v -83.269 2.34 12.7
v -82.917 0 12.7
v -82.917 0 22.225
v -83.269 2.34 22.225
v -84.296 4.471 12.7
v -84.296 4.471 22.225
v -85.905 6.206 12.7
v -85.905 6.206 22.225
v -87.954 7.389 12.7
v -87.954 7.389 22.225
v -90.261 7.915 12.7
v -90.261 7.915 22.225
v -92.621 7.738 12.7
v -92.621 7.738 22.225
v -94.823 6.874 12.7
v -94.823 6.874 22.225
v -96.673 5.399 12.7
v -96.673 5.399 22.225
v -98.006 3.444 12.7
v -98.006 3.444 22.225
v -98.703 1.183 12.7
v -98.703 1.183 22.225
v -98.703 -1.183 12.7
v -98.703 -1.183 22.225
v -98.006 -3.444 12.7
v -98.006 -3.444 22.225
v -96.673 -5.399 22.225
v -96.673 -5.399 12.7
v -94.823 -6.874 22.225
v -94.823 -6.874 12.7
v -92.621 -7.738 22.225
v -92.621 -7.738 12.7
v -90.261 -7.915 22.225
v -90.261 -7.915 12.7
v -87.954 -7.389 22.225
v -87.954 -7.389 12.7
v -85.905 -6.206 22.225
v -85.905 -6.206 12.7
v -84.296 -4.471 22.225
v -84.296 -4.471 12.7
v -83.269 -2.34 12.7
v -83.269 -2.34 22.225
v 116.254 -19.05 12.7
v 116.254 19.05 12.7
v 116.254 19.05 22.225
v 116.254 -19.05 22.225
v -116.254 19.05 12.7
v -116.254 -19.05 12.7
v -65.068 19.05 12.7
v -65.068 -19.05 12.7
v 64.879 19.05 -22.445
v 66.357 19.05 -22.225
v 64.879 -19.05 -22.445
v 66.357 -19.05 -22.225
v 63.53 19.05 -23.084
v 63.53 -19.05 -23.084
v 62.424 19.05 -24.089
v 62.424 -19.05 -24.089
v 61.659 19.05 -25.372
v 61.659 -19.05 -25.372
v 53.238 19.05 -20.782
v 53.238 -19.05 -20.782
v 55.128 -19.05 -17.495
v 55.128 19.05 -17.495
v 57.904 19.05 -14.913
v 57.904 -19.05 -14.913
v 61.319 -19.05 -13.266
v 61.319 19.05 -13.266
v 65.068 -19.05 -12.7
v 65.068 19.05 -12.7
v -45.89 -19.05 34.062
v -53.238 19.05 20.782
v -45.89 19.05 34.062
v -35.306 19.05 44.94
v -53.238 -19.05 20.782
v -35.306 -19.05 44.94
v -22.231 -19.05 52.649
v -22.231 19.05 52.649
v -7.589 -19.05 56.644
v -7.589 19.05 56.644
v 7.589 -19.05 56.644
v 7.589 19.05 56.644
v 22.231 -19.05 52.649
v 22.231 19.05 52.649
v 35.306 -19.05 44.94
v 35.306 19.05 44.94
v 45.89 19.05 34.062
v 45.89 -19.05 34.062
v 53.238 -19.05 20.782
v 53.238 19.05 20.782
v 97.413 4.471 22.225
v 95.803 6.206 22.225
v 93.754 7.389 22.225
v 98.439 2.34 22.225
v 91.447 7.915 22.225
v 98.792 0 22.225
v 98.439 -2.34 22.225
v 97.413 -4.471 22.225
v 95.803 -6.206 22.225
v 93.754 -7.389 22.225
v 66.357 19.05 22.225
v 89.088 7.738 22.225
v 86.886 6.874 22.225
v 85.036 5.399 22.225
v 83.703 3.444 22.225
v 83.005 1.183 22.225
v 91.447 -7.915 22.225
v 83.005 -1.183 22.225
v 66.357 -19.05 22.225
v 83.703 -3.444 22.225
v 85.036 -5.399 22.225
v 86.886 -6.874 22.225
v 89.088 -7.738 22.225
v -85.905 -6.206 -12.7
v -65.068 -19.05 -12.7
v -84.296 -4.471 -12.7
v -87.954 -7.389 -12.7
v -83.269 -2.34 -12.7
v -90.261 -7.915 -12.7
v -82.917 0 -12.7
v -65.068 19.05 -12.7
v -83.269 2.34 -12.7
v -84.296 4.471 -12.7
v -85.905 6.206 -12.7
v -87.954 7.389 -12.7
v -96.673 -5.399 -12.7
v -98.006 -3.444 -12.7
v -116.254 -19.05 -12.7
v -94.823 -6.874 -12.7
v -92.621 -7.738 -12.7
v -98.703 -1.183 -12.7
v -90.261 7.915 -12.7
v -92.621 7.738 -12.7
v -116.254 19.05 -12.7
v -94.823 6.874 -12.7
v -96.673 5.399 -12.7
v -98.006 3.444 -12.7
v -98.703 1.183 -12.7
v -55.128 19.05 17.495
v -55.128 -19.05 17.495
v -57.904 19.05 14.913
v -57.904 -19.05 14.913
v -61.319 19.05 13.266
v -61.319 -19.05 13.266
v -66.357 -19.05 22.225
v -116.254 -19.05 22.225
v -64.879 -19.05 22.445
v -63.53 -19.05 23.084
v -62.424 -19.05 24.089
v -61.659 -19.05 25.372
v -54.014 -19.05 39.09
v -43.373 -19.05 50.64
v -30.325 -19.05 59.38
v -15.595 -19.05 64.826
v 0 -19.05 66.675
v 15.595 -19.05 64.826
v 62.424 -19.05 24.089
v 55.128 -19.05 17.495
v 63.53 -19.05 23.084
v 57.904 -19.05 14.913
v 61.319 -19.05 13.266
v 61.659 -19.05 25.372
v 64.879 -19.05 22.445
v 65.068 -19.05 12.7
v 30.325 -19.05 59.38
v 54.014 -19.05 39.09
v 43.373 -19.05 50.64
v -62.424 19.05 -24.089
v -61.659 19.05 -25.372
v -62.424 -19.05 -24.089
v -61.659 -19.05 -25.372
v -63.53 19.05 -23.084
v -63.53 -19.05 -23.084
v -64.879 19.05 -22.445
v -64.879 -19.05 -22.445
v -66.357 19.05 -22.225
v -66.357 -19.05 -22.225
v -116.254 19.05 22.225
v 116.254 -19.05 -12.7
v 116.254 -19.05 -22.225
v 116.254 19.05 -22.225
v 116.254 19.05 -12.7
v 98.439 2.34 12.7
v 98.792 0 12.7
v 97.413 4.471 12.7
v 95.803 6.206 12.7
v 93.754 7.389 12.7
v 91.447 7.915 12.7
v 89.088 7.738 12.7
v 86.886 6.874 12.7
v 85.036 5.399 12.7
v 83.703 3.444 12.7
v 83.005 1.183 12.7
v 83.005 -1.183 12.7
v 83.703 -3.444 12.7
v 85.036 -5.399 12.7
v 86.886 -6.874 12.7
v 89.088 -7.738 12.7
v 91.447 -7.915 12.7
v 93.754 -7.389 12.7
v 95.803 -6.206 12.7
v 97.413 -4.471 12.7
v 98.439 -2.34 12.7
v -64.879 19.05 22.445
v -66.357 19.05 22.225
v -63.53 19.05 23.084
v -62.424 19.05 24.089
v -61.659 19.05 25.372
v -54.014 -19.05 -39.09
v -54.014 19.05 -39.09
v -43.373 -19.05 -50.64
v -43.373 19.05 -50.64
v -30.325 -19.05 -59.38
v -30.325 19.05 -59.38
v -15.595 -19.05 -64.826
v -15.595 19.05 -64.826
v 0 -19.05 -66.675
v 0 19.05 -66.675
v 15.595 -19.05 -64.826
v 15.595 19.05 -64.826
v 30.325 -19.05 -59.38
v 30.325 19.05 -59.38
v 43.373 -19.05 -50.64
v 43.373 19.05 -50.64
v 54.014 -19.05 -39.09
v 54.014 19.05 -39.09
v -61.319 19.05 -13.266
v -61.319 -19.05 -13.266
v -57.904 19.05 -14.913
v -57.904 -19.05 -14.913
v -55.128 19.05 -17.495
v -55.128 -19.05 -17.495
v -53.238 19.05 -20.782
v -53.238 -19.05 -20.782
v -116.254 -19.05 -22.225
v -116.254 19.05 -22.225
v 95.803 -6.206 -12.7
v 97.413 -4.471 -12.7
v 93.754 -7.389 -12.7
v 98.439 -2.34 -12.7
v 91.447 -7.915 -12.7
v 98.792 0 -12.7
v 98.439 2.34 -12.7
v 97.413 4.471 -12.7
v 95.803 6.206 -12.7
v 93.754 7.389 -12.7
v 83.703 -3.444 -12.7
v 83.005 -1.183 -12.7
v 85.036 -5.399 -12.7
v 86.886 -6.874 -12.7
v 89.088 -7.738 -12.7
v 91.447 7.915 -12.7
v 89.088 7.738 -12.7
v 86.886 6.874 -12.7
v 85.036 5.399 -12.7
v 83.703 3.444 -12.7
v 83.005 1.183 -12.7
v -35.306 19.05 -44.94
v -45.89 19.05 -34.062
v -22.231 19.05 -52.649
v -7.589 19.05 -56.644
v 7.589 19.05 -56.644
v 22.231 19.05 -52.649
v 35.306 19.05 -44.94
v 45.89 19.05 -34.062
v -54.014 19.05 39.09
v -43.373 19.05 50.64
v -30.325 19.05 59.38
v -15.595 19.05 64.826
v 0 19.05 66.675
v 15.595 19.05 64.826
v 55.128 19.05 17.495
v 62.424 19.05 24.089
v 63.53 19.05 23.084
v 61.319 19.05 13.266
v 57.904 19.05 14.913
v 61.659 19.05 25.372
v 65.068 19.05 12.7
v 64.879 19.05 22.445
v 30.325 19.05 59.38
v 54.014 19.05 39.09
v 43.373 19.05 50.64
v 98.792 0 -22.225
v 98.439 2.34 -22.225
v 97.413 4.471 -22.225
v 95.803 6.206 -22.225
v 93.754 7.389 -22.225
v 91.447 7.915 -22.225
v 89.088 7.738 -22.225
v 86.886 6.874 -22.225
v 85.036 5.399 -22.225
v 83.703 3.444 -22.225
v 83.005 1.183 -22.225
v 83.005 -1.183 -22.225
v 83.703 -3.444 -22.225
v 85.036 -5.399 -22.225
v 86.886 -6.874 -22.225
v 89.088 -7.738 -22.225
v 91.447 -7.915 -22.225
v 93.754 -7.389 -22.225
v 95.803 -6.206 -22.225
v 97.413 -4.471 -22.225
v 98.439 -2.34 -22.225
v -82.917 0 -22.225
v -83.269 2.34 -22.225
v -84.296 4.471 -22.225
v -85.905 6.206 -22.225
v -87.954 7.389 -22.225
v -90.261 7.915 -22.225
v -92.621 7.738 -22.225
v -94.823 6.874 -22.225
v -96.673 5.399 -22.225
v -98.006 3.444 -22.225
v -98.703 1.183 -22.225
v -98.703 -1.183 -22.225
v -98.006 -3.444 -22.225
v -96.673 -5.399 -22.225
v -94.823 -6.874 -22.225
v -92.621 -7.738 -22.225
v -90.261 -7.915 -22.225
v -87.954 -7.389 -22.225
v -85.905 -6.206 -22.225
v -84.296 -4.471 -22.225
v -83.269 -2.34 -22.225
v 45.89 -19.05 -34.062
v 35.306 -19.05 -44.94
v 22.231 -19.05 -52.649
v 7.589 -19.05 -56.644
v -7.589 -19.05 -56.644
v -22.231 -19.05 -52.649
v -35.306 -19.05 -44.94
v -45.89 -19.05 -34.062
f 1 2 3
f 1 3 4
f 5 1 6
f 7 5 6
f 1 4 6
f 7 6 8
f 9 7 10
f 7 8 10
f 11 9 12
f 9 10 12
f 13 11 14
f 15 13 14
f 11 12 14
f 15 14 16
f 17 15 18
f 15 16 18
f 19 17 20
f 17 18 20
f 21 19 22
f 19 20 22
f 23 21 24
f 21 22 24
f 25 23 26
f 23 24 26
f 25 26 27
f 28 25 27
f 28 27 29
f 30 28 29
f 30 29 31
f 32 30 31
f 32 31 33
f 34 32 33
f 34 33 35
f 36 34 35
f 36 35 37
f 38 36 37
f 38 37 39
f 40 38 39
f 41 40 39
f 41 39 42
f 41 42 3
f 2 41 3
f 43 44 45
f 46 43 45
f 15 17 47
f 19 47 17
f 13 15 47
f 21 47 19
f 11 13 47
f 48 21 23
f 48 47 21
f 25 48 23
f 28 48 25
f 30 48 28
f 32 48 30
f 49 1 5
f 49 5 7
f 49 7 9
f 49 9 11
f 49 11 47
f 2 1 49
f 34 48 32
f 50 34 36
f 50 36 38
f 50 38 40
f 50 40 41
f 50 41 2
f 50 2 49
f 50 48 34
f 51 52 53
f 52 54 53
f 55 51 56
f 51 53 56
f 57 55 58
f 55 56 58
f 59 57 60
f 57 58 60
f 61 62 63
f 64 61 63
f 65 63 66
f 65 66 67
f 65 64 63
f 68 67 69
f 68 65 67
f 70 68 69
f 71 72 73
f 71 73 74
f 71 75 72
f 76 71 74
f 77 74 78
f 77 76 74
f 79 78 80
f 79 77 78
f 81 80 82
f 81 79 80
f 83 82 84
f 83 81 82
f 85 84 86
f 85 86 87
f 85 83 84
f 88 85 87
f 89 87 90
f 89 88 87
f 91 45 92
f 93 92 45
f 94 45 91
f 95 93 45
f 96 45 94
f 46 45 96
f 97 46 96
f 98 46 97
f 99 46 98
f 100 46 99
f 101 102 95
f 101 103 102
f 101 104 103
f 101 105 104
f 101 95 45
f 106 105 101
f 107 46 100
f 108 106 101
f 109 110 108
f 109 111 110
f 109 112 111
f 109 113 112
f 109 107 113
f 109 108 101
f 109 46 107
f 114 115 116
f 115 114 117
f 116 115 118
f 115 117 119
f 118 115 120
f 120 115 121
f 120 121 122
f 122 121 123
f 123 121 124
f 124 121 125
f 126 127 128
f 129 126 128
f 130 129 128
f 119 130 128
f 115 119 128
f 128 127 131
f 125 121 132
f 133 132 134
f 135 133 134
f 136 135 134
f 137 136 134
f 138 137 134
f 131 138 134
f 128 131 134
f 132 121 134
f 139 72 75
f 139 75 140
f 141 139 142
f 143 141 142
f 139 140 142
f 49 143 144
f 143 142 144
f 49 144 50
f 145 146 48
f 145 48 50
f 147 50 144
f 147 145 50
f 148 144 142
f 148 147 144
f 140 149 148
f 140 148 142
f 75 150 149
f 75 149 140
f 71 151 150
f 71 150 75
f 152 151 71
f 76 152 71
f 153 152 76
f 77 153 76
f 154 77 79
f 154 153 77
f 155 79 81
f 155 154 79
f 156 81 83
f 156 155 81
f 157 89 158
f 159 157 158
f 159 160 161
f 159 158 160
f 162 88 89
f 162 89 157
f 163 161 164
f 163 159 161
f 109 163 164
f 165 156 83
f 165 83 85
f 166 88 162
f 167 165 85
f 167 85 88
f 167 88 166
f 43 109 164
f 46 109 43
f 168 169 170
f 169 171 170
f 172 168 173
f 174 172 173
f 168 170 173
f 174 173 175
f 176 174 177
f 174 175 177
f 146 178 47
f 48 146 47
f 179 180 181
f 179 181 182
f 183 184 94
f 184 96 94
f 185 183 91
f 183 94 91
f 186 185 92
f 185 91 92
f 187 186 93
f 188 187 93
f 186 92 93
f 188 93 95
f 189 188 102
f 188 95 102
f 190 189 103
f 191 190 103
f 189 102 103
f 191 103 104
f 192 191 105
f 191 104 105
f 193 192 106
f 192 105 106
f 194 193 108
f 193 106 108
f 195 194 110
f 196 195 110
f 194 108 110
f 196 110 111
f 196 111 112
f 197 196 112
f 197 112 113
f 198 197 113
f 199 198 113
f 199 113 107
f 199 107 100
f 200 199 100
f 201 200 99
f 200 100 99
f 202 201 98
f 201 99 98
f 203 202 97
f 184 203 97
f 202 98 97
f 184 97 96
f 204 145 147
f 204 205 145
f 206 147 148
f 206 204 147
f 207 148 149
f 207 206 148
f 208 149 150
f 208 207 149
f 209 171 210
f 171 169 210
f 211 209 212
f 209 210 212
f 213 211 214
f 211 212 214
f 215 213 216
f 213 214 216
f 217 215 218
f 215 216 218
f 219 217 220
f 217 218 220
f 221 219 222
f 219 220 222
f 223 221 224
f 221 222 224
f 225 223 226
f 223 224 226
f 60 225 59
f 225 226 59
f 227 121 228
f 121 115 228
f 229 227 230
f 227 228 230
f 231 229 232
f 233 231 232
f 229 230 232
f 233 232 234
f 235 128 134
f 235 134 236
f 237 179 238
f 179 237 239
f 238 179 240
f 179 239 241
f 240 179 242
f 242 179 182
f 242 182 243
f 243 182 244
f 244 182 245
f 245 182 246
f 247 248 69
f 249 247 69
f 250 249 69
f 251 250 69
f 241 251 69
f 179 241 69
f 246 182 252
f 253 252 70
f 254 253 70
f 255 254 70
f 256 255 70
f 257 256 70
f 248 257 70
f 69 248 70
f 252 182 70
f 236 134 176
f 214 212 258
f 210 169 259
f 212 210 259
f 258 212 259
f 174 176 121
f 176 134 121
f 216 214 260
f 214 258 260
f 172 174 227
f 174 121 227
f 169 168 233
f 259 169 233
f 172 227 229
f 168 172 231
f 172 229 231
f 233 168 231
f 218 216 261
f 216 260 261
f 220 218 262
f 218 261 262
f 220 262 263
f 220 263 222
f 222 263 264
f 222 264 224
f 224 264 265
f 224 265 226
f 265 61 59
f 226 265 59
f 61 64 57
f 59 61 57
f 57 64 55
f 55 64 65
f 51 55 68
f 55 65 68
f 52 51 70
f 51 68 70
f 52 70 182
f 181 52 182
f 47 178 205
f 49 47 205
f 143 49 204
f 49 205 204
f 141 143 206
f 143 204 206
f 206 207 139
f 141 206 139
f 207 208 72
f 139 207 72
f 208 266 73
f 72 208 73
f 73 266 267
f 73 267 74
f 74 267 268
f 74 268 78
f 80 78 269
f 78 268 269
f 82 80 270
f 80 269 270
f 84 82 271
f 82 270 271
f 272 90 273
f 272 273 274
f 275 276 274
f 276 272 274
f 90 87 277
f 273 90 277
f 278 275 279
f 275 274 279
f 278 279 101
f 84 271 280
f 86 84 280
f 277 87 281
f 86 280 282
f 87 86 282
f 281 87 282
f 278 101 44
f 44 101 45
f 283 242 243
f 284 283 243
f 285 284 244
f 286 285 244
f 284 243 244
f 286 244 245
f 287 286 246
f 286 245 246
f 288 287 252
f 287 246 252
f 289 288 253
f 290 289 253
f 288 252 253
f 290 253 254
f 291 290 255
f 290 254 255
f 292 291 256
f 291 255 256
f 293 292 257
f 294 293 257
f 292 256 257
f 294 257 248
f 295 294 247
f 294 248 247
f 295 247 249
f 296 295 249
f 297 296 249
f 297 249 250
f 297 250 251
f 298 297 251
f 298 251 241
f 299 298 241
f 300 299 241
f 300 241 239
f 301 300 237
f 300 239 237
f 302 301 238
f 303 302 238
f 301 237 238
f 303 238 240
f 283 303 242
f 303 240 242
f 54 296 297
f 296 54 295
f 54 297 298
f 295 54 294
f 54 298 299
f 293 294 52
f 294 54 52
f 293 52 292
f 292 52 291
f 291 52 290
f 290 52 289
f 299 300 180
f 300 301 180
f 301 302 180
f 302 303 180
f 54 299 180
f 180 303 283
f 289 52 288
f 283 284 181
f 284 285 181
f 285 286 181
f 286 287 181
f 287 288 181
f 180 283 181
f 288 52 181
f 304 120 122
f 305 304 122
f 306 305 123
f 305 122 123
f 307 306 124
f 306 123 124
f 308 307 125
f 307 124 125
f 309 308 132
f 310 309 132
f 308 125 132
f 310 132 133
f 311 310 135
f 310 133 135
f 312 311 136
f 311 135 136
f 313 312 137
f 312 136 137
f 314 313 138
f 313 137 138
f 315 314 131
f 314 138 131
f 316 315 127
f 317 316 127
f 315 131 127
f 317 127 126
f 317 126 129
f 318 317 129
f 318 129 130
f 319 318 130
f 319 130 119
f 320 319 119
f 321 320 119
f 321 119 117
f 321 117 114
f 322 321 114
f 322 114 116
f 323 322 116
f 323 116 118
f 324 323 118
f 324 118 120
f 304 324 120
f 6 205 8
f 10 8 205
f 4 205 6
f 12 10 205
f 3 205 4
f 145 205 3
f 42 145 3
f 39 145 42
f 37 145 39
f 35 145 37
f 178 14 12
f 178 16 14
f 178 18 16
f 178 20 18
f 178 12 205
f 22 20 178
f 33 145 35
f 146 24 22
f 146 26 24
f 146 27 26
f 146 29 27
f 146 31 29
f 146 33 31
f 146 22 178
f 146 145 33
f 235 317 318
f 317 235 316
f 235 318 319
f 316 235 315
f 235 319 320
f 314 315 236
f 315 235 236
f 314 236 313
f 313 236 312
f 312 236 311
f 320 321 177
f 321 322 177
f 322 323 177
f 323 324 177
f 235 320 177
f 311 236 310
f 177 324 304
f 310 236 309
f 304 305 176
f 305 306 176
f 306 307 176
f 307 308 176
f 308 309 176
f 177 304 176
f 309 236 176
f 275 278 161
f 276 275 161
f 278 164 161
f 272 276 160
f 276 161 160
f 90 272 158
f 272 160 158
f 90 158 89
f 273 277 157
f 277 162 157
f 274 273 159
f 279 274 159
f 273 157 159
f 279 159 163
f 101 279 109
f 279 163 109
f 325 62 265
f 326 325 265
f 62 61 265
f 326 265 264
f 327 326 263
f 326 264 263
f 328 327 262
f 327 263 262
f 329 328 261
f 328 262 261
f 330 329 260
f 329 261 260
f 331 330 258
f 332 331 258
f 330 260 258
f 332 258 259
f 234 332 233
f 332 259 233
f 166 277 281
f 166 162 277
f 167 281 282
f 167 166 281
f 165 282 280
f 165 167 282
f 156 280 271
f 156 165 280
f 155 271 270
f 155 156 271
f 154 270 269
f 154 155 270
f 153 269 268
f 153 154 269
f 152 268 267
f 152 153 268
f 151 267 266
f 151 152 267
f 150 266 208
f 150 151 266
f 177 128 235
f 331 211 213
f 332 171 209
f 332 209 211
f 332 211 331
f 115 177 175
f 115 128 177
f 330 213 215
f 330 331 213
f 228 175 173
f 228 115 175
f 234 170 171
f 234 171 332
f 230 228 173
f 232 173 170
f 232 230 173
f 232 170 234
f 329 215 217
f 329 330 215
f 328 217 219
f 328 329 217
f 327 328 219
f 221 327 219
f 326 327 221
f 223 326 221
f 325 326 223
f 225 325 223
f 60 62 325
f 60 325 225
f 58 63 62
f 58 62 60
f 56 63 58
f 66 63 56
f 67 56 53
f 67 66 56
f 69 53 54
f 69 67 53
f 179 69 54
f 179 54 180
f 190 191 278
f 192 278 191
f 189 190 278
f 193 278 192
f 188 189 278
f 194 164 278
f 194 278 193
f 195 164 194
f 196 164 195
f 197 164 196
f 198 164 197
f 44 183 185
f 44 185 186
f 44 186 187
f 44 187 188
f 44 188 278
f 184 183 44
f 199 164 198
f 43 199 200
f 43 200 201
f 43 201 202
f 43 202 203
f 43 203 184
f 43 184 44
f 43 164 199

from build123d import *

# Parameters (mm, degrees)
F1_DEPTH = 19.05
F2_R     = 5.08
F3_R     = 12.7
F4_R     = 7.9375
F5_DEPTH = 50.8
F6_R     = 7.9375
F7_DEPTH = 25.4


with BuildPart() as f1:
    # F0 (on Front) → F1 (new body, symmetric)
    with BuildSketch(Plane.XZ):
        with BuildLine():
            ThreePointArc((55.721024, -12.7), (0, -57.15), (-55.721024, -12.7))
            Line((-55.721024, -12.7), (-65.454302, -12.7))
            Line((-65.454302, -12.7), (-116.254302, -12.7))
            Line((-116.254302, -12.7), (-116.254302, -22.225))
            Line((-116.254302, -22.225), (-62.861793, -22.225))
            ThreePointArc((-62.861793, -22.225), (0, -66.675), (62.861793, -22.225))
            Line((62.861793, -22.225), (116.254302, -22.225))
            Line((116.254302, -22.225), (116.254302, -12.7))
            Line((116.254302, -12.7), (65.454302, -12.7))
            Line((65.454302, -12.7), (55.721024, -12.7))
        make_face()
        with BuildLine():
            Line((-116.254302, 12.7), (-65.454302, 12.7))
            Line((-65.454302, 12.7), (-55.721024, 12.7))
            ThreePointArc((-55.721024, 12.7), (0, 57.15), (55.721024, 12.7))
            Line((55.721024, 12.7), (65.454302, 12.7))
            Line((65.454302, 12.7), (116.254302, 12.7))
            Line((116.254302, 12.7), (116.254302, 22.225))
            Line((116.254302, 22.225), (62.861793, 22.225))
            ThreePointArc((62.861793, 22.225), (0, 66.675), (-62.861793, 22.225))
            Line((-62.861793, 22.225), (-116.254302, 22.225))
            Line((-116.254302, 22.225), (-116.254302, 12.7))
        make_face()
    extrude(amount=F1_DEPTH, both=True)

    # F2
    f2_edges = [f1.edges().sort_by_distance(p)[0] for p in [
        (-62.861793, 0, 22.225),
        (62.861793, 0, 22.225),
        (62.861793, 0, -22.225),
        (-62.861793, 0, -22.225),
    ]]
    fillet(f2_edges, radius=F2_R)

    # F3
    f3_edges = [f1.edges().sort_by_distance(p)[0] for p in [
        (-55.721024, 0, 12.7),
        (55.721024, 0, 12.7),
        (55.721024, 0, -12.7),
        (-55.721024, 0, -12.7),
    ]]
    fillet(f3_edges, radius=F3_R)

    # F4 (on face) → F5 (cut, symmetric)
    with BuildSketch(Plane.XY.offset(22.225)):
        with Locations((-90.854302, 0)):
            Circle(F4_R)
        with Locations((90.854302, 0)):
            Circle(F4_R)
    extrude(amount=F5_DEPTH, both=True, mode=Mode.SUBTRACT)

    # F6 (on face) → F7 (cut)
    with BuildSketch(Plane(origin=(0, 0, -22.225), x_dir=(1, 0, 0), z_dir=(0, 0, -1))):
        with Locations((90.854302, 0)):
            Circle(F6_R)
        with Locations((-90.854302, 0)):
            Circle(F6_R)
    extrude(amount=-F7_DEPTH, mode=Mode.SUBTRACT)


solid = f1.part
